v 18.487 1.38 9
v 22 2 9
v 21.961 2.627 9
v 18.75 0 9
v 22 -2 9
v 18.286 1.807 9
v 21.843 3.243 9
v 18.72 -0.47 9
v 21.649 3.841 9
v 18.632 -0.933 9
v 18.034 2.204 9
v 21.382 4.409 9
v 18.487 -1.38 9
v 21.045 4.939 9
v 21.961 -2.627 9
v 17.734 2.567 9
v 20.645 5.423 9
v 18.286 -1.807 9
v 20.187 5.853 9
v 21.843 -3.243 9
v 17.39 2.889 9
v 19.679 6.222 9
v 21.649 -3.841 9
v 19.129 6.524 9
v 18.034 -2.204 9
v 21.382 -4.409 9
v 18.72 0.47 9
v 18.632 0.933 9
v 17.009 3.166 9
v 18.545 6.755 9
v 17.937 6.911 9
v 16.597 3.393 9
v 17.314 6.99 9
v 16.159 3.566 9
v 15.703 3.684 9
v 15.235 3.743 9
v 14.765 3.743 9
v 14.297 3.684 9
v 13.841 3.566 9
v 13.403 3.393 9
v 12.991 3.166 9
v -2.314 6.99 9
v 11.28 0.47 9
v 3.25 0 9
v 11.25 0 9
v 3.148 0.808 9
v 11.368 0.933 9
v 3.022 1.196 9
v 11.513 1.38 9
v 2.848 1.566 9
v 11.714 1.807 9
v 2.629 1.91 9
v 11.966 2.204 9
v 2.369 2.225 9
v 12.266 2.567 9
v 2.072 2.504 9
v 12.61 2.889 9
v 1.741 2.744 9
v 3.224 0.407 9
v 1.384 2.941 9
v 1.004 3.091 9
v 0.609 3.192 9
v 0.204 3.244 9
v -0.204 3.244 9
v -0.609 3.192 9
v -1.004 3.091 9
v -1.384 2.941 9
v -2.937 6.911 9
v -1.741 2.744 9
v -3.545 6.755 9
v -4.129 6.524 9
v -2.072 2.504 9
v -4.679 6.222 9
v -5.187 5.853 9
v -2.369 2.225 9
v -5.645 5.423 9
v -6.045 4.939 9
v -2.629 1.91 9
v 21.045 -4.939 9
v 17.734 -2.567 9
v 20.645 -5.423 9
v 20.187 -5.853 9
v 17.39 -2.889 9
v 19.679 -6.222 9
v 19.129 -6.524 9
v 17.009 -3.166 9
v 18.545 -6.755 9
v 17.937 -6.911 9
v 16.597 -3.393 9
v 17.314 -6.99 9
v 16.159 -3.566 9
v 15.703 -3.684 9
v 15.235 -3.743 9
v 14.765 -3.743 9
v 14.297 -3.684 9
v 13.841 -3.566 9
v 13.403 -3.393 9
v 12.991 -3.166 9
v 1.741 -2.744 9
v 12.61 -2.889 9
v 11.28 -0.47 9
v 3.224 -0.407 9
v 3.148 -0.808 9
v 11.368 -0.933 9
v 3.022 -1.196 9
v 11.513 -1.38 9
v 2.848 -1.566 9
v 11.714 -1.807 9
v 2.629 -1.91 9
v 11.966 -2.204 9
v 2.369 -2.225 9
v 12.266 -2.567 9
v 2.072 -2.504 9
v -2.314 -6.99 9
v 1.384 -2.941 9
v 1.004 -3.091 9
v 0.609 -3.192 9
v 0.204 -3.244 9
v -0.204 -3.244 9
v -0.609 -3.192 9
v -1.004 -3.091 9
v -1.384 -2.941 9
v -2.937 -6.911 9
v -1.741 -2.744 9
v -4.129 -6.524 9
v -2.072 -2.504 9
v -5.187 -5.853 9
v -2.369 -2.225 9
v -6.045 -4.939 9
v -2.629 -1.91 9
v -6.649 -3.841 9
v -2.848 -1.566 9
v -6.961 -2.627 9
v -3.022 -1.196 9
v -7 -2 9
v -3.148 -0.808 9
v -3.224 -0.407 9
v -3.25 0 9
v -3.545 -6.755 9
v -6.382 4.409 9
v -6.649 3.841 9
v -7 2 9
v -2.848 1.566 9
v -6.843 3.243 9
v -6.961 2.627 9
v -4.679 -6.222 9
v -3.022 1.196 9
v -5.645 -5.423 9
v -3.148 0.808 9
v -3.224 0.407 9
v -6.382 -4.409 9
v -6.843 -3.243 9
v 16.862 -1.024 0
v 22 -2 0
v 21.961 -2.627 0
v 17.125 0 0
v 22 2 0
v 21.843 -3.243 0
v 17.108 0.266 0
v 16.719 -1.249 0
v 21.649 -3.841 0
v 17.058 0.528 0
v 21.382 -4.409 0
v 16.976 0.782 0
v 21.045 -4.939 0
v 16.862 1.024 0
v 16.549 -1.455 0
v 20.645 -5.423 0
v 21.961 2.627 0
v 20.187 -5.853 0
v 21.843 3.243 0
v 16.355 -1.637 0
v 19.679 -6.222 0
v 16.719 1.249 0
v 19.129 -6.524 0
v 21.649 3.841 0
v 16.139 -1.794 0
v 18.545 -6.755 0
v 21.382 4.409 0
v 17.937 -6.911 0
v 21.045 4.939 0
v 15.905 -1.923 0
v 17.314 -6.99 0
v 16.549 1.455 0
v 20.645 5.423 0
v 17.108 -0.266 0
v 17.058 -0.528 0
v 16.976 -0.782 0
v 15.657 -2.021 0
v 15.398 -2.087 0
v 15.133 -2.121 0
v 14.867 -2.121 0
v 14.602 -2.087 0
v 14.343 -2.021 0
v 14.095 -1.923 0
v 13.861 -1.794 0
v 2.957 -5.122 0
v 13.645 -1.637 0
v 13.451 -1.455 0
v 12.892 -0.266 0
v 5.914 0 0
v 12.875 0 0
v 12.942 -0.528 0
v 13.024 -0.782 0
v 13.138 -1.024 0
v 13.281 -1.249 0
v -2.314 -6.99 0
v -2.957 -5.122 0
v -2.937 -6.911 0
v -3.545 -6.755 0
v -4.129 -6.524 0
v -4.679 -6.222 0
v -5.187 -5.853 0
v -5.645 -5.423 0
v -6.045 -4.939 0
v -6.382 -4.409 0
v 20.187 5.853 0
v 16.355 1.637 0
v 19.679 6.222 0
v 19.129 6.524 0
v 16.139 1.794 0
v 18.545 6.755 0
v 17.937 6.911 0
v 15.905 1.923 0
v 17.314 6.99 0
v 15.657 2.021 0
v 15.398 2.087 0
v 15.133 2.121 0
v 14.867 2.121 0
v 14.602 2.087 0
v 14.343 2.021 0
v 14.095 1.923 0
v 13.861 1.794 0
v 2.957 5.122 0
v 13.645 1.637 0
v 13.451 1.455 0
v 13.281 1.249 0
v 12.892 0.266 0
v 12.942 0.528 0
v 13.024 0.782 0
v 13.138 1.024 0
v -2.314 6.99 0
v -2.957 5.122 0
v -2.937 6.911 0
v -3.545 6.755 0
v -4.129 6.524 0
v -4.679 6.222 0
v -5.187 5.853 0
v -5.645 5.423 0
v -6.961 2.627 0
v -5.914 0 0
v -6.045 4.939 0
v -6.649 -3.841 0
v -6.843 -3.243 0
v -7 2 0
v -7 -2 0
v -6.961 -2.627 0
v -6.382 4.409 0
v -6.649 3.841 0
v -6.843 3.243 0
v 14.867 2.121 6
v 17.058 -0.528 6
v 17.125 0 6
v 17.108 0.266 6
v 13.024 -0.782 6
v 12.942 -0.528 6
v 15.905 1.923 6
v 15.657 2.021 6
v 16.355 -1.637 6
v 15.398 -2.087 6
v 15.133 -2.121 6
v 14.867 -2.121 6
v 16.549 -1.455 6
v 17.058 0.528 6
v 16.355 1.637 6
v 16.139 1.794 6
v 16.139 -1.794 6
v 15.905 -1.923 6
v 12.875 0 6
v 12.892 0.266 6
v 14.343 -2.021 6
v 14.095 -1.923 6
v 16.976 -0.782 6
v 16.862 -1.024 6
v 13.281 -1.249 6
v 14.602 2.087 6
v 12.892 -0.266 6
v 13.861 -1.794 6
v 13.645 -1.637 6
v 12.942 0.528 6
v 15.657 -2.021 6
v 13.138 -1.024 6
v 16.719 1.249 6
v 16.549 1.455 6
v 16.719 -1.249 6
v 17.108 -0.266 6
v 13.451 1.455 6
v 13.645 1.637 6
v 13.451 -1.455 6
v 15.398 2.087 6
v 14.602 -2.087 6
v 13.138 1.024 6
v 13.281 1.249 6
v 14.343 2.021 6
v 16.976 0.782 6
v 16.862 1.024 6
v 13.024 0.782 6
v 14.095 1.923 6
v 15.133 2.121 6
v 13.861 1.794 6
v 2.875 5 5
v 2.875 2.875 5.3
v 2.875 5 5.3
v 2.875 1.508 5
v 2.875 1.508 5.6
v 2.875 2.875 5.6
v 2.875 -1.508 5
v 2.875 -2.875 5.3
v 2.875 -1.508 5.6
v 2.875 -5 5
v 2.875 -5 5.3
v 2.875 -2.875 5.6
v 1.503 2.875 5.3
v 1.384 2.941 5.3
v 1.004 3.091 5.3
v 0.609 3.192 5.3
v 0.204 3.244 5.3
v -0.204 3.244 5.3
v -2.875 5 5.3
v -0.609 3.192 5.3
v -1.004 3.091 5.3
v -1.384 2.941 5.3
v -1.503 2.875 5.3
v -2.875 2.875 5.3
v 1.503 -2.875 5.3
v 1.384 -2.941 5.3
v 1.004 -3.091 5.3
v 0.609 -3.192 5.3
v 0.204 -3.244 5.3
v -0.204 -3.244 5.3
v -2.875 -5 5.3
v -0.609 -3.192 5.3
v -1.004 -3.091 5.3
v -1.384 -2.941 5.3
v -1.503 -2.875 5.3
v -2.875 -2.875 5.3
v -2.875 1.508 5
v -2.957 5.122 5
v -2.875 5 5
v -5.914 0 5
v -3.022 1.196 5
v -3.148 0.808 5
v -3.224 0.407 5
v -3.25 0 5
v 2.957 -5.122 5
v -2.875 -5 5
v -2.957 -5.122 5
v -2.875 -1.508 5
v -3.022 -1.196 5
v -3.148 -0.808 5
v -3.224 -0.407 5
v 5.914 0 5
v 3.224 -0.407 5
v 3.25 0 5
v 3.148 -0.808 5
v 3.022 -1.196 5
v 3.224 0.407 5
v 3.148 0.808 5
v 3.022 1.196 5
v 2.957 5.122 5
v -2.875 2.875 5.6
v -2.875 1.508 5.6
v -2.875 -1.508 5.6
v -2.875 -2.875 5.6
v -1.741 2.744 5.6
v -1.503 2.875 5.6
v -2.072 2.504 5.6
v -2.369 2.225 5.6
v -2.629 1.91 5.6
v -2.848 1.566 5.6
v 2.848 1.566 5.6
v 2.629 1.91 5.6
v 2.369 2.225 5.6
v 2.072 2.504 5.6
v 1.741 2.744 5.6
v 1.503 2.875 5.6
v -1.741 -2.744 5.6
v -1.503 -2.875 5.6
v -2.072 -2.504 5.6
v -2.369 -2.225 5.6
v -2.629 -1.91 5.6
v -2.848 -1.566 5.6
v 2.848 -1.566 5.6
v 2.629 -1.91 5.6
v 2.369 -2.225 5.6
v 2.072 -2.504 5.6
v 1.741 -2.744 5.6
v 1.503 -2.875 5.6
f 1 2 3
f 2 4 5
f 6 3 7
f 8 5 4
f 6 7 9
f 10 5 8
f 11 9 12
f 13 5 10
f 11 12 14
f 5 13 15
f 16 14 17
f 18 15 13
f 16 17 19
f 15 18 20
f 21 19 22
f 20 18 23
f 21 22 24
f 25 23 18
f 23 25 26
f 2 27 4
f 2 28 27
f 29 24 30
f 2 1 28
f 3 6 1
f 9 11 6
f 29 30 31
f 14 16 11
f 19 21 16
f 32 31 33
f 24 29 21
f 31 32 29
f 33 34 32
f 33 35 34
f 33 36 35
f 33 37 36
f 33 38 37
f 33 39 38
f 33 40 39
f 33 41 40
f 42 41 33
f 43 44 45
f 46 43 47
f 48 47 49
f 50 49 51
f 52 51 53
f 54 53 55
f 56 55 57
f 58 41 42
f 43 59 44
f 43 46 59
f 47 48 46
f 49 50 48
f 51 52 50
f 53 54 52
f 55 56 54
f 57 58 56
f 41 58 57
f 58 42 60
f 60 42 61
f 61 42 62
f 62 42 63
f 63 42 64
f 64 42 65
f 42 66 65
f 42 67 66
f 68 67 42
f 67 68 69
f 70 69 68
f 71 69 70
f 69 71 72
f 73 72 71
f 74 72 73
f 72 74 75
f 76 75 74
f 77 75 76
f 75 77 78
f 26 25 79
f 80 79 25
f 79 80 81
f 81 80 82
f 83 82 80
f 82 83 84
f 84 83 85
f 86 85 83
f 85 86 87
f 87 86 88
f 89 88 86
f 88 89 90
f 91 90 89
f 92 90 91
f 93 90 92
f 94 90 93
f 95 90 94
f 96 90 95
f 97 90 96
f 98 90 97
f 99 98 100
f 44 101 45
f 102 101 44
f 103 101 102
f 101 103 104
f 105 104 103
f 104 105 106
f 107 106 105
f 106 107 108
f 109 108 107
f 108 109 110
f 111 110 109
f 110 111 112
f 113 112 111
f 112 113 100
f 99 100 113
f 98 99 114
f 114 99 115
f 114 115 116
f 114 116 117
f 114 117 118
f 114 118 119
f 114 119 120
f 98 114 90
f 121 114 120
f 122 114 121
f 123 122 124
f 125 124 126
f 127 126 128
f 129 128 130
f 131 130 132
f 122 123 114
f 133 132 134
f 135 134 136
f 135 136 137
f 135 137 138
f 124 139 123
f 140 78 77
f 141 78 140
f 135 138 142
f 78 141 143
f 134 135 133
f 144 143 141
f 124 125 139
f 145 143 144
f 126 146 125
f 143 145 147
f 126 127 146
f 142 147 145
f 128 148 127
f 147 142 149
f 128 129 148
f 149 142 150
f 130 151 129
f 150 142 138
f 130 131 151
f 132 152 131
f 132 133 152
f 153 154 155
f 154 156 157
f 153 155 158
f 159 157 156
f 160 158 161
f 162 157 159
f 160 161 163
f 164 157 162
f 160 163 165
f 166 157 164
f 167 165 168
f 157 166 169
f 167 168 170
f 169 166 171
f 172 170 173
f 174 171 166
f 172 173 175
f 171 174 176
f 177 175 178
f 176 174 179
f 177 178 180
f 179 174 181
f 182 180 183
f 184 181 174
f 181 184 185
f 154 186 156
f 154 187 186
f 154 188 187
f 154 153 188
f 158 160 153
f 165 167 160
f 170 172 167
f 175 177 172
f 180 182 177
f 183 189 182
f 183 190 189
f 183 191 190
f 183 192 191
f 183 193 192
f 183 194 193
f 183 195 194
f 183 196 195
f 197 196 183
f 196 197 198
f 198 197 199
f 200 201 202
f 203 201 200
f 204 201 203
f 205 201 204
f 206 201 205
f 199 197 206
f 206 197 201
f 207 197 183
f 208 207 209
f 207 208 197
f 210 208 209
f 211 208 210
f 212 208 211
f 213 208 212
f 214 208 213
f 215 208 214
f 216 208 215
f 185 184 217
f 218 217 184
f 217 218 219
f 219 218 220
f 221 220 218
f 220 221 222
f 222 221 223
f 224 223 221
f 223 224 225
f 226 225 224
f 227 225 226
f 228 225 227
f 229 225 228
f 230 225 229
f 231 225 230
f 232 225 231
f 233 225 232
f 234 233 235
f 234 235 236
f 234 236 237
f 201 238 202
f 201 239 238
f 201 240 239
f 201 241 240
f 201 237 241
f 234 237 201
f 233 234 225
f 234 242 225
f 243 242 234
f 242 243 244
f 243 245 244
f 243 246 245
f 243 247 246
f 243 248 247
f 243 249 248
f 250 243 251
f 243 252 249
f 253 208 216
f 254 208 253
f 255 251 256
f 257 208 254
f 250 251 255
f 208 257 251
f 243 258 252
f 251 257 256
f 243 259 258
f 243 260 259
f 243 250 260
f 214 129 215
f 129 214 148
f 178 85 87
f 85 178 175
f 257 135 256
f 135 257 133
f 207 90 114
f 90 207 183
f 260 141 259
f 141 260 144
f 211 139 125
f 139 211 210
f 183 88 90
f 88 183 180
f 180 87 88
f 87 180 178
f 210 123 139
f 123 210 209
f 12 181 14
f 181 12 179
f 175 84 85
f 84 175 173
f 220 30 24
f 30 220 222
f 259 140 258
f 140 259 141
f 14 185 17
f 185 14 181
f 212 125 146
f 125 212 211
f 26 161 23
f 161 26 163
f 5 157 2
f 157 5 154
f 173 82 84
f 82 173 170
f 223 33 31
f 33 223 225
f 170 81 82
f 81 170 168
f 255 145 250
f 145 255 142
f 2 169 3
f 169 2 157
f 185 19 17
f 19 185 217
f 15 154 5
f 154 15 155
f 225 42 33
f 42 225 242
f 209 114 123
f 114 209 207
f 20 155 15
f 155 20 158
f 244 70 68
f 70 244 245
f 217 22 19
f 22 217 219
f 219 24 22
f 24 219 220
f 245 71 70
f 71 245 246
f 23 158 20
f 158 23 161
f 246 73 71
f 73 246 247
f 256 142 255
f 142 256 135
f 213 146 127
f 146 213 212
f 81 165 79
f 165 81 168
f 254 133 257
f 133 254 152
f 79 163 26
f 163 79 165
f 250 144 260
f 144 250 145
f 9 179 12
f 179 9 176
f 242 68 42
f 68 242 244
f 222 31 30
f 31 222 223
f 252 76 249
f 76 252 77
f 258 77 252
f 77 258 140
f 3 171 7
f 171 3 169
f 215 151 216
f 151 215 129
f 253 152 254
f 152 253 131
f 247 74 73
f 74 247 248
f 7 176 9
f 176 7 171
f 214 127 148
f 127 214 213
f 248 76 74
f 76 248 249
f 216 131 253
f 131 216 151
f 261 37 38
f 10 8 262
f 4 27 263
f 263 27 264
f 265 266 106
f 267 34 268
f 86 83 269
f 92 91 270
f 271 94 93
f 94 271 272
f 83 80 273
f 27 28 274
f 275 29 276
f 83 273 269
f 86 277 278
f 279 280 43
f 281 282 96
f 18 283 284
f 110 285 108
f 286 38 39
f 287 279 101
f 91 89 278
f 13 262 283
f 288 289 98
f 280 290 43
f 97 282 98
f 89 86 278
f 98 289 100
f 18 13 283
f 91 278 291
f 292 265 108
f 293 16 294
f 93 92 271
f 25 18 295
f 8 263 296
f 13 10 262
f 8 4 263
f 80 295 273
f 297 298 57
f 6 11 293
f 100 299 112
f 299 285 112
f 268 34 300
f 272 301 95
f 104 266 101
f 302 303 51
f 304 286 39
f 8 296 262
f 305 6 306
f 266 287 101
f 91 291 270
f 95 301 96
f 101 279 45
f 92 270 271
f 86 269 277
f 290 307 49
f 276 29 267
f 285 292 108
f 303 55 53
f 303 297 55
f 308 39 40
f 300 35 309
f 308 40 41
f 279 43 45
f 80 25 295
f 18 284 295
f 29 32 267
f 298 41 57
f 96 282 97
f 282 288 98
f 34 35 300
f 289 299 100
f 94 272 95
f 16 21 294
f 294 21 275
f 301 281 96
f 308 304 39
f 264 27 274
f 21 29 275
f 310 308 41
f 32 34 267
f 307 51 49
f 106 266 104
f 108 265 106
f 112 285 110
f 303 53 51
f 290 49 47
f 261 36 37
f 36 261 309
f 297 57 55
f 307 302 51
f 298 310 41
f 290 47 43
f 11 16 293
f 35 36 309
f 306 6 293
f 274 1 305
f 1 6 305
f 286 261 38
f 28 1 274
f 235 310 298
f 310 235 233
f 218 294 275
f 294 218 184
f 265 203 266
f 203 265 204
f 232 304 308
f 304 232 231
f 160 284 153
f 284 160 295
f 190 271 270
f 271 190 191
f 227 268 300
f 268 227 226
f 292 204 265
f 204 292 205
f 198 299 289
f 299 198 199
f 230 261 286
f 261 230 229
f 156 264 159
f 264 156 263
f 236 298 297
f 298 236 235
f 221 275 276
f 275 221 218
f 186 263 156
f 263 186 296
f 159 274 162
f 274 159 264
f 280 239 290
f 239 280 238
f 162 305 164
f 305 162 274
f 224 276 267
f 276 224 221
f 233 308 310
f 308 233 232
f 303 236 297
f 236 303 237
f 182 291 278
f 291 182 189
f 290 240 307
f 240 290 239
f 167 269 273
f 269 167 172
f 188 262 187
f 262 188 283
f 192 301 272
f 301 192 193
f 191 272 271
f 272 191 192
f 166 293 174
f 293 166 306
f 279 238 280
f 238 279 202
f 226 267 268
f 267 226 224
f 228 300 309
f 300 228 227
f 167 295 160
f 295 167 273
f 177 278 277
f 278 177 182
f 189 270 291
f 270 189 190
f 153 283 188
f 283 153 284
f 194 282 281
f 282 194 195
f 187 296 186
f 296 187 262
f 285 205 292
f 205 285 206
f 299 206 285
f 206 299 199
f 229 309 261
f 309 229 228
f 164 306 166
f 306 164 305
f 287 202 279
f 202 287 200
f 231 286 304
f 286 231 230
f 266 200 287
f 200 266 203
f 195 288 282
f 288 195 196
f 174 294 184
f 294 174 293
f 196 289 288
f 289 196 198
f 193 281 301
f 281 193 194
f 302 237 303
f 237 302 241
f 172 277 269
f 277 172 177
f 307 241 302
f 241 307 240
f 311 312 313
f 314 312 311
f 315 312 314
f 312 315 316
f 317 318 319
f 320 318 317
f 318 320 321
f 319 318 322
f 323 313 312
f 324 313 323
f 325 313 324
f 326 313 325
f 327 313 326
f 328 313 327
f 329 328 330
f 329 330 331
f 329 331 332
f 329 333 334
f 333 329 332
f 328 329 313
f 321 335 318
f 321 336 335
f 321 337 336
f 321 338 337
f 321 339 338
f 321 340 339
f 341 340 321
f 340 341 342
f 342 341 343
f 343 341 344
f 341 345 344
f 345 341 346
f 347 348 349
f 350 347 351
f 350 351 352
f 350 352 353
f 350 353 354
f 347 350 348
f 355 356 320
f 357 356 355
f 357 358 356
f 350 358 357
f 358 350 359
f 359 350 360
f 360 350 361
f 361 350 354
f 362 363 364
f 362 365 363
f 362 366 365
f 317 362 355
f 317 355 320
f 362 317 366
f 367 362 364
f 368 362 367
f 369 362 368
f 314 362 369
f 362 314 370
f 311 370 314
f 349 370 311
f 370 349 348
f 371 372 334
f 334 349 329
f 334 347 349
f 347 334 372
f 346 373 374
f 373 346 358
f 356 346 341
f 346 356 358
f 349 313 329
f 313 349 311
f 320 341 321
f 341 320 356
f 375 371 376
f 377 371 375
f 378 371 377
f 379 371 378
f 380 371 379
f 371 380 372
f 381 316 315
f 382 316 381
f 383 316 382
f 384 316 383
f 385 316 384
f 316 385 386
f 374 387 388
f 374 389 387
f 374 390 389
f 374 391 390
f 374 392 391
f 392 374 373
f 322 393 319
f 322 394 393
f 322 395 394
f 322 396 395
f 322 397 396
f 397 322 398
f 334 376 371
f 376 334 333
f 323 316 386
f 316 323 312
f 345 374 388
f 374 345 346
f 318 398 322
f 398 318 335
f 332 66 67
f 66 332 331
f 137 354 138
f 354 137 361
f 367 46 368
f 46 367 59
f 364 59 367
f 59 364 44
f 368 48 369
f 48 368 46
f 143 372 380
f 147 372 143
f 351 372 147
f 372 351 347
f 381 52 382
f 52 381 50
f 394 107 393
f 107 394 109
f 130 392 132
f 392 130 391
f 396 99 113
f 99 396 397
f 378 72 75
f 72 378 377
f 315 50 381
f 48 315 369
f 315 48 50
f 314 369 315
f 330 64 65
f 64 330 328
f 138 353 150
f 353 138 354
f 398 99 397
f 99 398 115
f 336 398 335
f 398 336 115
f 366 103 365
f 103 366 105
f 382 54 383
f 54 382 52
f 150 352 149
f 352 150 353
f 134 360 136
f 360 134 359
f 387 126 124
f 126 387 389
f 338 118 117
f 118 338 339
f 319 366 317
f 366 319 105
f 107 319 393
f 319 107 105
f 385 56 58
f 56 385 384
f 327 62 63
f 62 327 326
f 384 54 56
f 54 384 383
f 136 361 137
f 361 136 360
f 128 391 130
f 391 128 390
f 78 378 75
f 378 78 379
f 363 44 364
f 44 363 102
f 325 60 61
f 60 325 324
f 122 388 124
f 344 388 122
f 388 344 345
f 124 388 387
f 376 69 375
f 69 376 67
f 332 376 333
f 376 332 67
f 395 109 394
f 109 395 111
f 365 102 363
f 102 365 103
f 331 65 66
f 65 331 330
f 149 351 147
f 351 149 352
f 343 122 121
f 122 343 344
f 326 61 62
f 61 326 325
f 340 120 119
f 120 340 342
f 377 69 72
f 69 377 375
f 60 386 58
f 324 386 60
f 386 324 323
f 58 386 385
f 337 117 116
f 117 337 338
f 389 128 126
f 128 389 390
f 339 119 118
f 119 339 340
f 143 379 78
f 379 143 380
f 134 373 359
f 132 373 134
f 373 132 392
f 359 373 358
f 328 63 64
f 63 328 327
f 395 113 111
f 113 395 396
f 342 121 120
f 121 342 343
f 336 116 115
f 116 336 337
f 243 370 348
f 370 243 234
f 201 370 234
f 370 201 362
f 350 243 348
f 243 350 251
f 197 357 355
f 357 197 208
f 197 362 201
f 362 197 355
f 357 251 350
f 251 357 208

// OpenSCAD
$fn = 50;


difference() {
	union() {
		cylinder(h = 9, r = 7.0000000000);
		translate(v = [7.5000000000, 0.0000000000, 0]) {
			hull() {
				translate(v = [-9.5000000000, 2.0000000000, 0]) {
					cylinder(h = 9, r = 5);
				}
				translate(v = [9.5000000000, 2.0000000000, 0]) {
					cylinder(h = 9, r = 5);
				}
				translate(v = [-9.5000000000, -2.0000000000, 0]) {
					cylinder(h = 9, r = 5);
				}
				translate(v = [9.5000000000, -2.0000000000, 0]) {
					cylinder(h = 9, r = 5);
				}
			}
		}
		translate(v = [7.5000000000, 0.0000000000, 0]) {
			hull() {
				translate(v = [-9.5000000000, 2.0000000000, 0]) {
					cylinder(h = 9, r = 5);
				}
				translate(v = [9.5000000000, 2.0000000000, 0]) {
					cylinder(h = 9, r = 5);
				}
				translate(v = [-9.5000000000, -2.0000000000, 0]) {
					cylinder(h = 9, r = 5);
				}
				translate(v = [9.5000000000, -2.0000000000, 0]) {
					cylinder(h = 9, r = 5);
				}
			}
		}
	}
	union() {
		translate(v = [15.0000000000, 0.0000000000, 9]) {
			rotate(a = [0, 0, 0]) {
				difference() {
					union() {
						#translate(v = [0, 0, -9.0000000000]) {
							cylinder(h = 9, r = 2.0000000000);
						}
						#translate(v = [0, 0, -3]) {
							cylinder(h = 3, r1 = 2.1250000000, r2 = 3.7500000000);
						}
						#translate(v = [0, 0, -9.0000000000]) {
							cylinder(h = 9, r = 2.1250000000);
						}
						#translate(v = [0, 0, -9.0000000000]) {
							cylinder(h = 9, r = 2.0000000000);
						}
					}
					union();
				}
			}
		}
		translate(v = [15.0000000000, 0.0000000000, 9]) {
			rotate(a = [0, 0, 0]) {
				difference() {
					union() {
						#translate(v = [0, 0, -9.0000000000]) {
							cylinder(h = 9, r = 2.0000000000);
						}
						#translate(v = [0, 0, -3]) {
							cylinder(h = 3, r1 = 2.1250000000, r2 = 3.7500000000);
						}
						#translate(v = [0, 0, -9.0000000000]) {
							cylinder(h = 9, r = 2.1250000000);
						}
						#translate(v = [0, 0, -9.0000000000]) {
							cylinder(h = 9, r = 2.0000000000);
						}
					}
					union();
				}
			}
		}
		translate(v = [0.0000000000, 0.0000000000, 0]) {
			rotate(a = [0, 0, 0]) {
				difference() {
					union() {
						#translate(v = [-2.8750000000, -5.0000000000, -0.3000000000]) {
							cube(size = [5.7500000000, 10, 0.3000000000]);
						}
						#translate(v = [-2.8750000000, -2.8750000000, -0.6000000000]) {
							cube(size = [5.7500000000, 5.7500000000, 0.3000000000]);
						}
						#translate(v = [-2.8750000000, -5.0000000000, 5]) {
							cube(size = [5.7500000000, 10, 0.3000000000]);
						}
						#translate(v = [-2.8750000000, -2.8750000000, 5.3000000000]) {
							cube(size = [5.7500000000, 5.7500000000, 0.3000000000]);
						}
						#translate(v = [0, 0, -100.0000000000]) {
							cylinder(h = 200, r = 3.2500000000);
						}
						#linear_extrude(height = 5) {
							polygon(points = [[5.9142500000, 0.0000000000], [2.9571250000, 5.1218907443], [-2.9571250000, 5.1218907443], [-5.9142500000, 0.0000000000], [-2.9571250000, -5.1218907443], [2.9571250000, -5.1218907443]]);
						}
						#translate(v = [-2.8750000000, -5.0000000000, -0.3000000000]) {
							cube(size = [5.7500000000, 10, 0.3000000000]);
						}
						#translate(v = [-2.8750000000, -2.8750000000, -0.6000000000]) {
							cube(size = [5.7500000000, 5.7500000000, 0.3000000000]);
						}
						#translate(v = [-2.8750000000, -5.0000000000, 5]) {
							cube(size = [5.7500000000, 10, 0.3000000000]);
						}
						#translate(v = [-2.8750000000, -2.8750000000, 5.3000000000]) {
							cube(size = [5.7500000000, 5.7500000000, 0.3000000000]);
						}
						#translate(v = [0, 0, -100.0000000000]) {
							cylinder(h = 200, r = 3.2500000000);
						}
						#translate(v = [-2.8750000000, -5.0000000000, -0.3000000000]) {
							cube(size = [5.7500000000, 10, 0.3000000000]);
						}
						#translate(v = [-2.8750000000, -2.8750000000, -0.6000000000]) {
							cube(size = [5.7500000000, 5.7500000000, 0.3000000000]);
						}
						#translate(v = [-2.8750000000, -5.0000000000, 5]) {
							cube(size = [5.7500000000, 10, 0.3000000000]);
						}
						#translate(v = [-2.8750000000, -2.8750000000, 5.3000000000]) {
							cube(size = [5.7500000000, 5.7500000000, 0.3000000000]);
						}
						#translate(v = [0, 0, -100.0000000000]) {
							cylinder(h = 200, r = 3.2500000000);
						}
					}
					union();
				}
			}
		}
		translate(v = [0, 0, -100]) {
			cylinder(h = 200, r = 3.2500000000);
		}
		translate(v = [0, 0, -100]) {
			cylinder(h = 200, r = 1.8000000000);
		}
	}
}
